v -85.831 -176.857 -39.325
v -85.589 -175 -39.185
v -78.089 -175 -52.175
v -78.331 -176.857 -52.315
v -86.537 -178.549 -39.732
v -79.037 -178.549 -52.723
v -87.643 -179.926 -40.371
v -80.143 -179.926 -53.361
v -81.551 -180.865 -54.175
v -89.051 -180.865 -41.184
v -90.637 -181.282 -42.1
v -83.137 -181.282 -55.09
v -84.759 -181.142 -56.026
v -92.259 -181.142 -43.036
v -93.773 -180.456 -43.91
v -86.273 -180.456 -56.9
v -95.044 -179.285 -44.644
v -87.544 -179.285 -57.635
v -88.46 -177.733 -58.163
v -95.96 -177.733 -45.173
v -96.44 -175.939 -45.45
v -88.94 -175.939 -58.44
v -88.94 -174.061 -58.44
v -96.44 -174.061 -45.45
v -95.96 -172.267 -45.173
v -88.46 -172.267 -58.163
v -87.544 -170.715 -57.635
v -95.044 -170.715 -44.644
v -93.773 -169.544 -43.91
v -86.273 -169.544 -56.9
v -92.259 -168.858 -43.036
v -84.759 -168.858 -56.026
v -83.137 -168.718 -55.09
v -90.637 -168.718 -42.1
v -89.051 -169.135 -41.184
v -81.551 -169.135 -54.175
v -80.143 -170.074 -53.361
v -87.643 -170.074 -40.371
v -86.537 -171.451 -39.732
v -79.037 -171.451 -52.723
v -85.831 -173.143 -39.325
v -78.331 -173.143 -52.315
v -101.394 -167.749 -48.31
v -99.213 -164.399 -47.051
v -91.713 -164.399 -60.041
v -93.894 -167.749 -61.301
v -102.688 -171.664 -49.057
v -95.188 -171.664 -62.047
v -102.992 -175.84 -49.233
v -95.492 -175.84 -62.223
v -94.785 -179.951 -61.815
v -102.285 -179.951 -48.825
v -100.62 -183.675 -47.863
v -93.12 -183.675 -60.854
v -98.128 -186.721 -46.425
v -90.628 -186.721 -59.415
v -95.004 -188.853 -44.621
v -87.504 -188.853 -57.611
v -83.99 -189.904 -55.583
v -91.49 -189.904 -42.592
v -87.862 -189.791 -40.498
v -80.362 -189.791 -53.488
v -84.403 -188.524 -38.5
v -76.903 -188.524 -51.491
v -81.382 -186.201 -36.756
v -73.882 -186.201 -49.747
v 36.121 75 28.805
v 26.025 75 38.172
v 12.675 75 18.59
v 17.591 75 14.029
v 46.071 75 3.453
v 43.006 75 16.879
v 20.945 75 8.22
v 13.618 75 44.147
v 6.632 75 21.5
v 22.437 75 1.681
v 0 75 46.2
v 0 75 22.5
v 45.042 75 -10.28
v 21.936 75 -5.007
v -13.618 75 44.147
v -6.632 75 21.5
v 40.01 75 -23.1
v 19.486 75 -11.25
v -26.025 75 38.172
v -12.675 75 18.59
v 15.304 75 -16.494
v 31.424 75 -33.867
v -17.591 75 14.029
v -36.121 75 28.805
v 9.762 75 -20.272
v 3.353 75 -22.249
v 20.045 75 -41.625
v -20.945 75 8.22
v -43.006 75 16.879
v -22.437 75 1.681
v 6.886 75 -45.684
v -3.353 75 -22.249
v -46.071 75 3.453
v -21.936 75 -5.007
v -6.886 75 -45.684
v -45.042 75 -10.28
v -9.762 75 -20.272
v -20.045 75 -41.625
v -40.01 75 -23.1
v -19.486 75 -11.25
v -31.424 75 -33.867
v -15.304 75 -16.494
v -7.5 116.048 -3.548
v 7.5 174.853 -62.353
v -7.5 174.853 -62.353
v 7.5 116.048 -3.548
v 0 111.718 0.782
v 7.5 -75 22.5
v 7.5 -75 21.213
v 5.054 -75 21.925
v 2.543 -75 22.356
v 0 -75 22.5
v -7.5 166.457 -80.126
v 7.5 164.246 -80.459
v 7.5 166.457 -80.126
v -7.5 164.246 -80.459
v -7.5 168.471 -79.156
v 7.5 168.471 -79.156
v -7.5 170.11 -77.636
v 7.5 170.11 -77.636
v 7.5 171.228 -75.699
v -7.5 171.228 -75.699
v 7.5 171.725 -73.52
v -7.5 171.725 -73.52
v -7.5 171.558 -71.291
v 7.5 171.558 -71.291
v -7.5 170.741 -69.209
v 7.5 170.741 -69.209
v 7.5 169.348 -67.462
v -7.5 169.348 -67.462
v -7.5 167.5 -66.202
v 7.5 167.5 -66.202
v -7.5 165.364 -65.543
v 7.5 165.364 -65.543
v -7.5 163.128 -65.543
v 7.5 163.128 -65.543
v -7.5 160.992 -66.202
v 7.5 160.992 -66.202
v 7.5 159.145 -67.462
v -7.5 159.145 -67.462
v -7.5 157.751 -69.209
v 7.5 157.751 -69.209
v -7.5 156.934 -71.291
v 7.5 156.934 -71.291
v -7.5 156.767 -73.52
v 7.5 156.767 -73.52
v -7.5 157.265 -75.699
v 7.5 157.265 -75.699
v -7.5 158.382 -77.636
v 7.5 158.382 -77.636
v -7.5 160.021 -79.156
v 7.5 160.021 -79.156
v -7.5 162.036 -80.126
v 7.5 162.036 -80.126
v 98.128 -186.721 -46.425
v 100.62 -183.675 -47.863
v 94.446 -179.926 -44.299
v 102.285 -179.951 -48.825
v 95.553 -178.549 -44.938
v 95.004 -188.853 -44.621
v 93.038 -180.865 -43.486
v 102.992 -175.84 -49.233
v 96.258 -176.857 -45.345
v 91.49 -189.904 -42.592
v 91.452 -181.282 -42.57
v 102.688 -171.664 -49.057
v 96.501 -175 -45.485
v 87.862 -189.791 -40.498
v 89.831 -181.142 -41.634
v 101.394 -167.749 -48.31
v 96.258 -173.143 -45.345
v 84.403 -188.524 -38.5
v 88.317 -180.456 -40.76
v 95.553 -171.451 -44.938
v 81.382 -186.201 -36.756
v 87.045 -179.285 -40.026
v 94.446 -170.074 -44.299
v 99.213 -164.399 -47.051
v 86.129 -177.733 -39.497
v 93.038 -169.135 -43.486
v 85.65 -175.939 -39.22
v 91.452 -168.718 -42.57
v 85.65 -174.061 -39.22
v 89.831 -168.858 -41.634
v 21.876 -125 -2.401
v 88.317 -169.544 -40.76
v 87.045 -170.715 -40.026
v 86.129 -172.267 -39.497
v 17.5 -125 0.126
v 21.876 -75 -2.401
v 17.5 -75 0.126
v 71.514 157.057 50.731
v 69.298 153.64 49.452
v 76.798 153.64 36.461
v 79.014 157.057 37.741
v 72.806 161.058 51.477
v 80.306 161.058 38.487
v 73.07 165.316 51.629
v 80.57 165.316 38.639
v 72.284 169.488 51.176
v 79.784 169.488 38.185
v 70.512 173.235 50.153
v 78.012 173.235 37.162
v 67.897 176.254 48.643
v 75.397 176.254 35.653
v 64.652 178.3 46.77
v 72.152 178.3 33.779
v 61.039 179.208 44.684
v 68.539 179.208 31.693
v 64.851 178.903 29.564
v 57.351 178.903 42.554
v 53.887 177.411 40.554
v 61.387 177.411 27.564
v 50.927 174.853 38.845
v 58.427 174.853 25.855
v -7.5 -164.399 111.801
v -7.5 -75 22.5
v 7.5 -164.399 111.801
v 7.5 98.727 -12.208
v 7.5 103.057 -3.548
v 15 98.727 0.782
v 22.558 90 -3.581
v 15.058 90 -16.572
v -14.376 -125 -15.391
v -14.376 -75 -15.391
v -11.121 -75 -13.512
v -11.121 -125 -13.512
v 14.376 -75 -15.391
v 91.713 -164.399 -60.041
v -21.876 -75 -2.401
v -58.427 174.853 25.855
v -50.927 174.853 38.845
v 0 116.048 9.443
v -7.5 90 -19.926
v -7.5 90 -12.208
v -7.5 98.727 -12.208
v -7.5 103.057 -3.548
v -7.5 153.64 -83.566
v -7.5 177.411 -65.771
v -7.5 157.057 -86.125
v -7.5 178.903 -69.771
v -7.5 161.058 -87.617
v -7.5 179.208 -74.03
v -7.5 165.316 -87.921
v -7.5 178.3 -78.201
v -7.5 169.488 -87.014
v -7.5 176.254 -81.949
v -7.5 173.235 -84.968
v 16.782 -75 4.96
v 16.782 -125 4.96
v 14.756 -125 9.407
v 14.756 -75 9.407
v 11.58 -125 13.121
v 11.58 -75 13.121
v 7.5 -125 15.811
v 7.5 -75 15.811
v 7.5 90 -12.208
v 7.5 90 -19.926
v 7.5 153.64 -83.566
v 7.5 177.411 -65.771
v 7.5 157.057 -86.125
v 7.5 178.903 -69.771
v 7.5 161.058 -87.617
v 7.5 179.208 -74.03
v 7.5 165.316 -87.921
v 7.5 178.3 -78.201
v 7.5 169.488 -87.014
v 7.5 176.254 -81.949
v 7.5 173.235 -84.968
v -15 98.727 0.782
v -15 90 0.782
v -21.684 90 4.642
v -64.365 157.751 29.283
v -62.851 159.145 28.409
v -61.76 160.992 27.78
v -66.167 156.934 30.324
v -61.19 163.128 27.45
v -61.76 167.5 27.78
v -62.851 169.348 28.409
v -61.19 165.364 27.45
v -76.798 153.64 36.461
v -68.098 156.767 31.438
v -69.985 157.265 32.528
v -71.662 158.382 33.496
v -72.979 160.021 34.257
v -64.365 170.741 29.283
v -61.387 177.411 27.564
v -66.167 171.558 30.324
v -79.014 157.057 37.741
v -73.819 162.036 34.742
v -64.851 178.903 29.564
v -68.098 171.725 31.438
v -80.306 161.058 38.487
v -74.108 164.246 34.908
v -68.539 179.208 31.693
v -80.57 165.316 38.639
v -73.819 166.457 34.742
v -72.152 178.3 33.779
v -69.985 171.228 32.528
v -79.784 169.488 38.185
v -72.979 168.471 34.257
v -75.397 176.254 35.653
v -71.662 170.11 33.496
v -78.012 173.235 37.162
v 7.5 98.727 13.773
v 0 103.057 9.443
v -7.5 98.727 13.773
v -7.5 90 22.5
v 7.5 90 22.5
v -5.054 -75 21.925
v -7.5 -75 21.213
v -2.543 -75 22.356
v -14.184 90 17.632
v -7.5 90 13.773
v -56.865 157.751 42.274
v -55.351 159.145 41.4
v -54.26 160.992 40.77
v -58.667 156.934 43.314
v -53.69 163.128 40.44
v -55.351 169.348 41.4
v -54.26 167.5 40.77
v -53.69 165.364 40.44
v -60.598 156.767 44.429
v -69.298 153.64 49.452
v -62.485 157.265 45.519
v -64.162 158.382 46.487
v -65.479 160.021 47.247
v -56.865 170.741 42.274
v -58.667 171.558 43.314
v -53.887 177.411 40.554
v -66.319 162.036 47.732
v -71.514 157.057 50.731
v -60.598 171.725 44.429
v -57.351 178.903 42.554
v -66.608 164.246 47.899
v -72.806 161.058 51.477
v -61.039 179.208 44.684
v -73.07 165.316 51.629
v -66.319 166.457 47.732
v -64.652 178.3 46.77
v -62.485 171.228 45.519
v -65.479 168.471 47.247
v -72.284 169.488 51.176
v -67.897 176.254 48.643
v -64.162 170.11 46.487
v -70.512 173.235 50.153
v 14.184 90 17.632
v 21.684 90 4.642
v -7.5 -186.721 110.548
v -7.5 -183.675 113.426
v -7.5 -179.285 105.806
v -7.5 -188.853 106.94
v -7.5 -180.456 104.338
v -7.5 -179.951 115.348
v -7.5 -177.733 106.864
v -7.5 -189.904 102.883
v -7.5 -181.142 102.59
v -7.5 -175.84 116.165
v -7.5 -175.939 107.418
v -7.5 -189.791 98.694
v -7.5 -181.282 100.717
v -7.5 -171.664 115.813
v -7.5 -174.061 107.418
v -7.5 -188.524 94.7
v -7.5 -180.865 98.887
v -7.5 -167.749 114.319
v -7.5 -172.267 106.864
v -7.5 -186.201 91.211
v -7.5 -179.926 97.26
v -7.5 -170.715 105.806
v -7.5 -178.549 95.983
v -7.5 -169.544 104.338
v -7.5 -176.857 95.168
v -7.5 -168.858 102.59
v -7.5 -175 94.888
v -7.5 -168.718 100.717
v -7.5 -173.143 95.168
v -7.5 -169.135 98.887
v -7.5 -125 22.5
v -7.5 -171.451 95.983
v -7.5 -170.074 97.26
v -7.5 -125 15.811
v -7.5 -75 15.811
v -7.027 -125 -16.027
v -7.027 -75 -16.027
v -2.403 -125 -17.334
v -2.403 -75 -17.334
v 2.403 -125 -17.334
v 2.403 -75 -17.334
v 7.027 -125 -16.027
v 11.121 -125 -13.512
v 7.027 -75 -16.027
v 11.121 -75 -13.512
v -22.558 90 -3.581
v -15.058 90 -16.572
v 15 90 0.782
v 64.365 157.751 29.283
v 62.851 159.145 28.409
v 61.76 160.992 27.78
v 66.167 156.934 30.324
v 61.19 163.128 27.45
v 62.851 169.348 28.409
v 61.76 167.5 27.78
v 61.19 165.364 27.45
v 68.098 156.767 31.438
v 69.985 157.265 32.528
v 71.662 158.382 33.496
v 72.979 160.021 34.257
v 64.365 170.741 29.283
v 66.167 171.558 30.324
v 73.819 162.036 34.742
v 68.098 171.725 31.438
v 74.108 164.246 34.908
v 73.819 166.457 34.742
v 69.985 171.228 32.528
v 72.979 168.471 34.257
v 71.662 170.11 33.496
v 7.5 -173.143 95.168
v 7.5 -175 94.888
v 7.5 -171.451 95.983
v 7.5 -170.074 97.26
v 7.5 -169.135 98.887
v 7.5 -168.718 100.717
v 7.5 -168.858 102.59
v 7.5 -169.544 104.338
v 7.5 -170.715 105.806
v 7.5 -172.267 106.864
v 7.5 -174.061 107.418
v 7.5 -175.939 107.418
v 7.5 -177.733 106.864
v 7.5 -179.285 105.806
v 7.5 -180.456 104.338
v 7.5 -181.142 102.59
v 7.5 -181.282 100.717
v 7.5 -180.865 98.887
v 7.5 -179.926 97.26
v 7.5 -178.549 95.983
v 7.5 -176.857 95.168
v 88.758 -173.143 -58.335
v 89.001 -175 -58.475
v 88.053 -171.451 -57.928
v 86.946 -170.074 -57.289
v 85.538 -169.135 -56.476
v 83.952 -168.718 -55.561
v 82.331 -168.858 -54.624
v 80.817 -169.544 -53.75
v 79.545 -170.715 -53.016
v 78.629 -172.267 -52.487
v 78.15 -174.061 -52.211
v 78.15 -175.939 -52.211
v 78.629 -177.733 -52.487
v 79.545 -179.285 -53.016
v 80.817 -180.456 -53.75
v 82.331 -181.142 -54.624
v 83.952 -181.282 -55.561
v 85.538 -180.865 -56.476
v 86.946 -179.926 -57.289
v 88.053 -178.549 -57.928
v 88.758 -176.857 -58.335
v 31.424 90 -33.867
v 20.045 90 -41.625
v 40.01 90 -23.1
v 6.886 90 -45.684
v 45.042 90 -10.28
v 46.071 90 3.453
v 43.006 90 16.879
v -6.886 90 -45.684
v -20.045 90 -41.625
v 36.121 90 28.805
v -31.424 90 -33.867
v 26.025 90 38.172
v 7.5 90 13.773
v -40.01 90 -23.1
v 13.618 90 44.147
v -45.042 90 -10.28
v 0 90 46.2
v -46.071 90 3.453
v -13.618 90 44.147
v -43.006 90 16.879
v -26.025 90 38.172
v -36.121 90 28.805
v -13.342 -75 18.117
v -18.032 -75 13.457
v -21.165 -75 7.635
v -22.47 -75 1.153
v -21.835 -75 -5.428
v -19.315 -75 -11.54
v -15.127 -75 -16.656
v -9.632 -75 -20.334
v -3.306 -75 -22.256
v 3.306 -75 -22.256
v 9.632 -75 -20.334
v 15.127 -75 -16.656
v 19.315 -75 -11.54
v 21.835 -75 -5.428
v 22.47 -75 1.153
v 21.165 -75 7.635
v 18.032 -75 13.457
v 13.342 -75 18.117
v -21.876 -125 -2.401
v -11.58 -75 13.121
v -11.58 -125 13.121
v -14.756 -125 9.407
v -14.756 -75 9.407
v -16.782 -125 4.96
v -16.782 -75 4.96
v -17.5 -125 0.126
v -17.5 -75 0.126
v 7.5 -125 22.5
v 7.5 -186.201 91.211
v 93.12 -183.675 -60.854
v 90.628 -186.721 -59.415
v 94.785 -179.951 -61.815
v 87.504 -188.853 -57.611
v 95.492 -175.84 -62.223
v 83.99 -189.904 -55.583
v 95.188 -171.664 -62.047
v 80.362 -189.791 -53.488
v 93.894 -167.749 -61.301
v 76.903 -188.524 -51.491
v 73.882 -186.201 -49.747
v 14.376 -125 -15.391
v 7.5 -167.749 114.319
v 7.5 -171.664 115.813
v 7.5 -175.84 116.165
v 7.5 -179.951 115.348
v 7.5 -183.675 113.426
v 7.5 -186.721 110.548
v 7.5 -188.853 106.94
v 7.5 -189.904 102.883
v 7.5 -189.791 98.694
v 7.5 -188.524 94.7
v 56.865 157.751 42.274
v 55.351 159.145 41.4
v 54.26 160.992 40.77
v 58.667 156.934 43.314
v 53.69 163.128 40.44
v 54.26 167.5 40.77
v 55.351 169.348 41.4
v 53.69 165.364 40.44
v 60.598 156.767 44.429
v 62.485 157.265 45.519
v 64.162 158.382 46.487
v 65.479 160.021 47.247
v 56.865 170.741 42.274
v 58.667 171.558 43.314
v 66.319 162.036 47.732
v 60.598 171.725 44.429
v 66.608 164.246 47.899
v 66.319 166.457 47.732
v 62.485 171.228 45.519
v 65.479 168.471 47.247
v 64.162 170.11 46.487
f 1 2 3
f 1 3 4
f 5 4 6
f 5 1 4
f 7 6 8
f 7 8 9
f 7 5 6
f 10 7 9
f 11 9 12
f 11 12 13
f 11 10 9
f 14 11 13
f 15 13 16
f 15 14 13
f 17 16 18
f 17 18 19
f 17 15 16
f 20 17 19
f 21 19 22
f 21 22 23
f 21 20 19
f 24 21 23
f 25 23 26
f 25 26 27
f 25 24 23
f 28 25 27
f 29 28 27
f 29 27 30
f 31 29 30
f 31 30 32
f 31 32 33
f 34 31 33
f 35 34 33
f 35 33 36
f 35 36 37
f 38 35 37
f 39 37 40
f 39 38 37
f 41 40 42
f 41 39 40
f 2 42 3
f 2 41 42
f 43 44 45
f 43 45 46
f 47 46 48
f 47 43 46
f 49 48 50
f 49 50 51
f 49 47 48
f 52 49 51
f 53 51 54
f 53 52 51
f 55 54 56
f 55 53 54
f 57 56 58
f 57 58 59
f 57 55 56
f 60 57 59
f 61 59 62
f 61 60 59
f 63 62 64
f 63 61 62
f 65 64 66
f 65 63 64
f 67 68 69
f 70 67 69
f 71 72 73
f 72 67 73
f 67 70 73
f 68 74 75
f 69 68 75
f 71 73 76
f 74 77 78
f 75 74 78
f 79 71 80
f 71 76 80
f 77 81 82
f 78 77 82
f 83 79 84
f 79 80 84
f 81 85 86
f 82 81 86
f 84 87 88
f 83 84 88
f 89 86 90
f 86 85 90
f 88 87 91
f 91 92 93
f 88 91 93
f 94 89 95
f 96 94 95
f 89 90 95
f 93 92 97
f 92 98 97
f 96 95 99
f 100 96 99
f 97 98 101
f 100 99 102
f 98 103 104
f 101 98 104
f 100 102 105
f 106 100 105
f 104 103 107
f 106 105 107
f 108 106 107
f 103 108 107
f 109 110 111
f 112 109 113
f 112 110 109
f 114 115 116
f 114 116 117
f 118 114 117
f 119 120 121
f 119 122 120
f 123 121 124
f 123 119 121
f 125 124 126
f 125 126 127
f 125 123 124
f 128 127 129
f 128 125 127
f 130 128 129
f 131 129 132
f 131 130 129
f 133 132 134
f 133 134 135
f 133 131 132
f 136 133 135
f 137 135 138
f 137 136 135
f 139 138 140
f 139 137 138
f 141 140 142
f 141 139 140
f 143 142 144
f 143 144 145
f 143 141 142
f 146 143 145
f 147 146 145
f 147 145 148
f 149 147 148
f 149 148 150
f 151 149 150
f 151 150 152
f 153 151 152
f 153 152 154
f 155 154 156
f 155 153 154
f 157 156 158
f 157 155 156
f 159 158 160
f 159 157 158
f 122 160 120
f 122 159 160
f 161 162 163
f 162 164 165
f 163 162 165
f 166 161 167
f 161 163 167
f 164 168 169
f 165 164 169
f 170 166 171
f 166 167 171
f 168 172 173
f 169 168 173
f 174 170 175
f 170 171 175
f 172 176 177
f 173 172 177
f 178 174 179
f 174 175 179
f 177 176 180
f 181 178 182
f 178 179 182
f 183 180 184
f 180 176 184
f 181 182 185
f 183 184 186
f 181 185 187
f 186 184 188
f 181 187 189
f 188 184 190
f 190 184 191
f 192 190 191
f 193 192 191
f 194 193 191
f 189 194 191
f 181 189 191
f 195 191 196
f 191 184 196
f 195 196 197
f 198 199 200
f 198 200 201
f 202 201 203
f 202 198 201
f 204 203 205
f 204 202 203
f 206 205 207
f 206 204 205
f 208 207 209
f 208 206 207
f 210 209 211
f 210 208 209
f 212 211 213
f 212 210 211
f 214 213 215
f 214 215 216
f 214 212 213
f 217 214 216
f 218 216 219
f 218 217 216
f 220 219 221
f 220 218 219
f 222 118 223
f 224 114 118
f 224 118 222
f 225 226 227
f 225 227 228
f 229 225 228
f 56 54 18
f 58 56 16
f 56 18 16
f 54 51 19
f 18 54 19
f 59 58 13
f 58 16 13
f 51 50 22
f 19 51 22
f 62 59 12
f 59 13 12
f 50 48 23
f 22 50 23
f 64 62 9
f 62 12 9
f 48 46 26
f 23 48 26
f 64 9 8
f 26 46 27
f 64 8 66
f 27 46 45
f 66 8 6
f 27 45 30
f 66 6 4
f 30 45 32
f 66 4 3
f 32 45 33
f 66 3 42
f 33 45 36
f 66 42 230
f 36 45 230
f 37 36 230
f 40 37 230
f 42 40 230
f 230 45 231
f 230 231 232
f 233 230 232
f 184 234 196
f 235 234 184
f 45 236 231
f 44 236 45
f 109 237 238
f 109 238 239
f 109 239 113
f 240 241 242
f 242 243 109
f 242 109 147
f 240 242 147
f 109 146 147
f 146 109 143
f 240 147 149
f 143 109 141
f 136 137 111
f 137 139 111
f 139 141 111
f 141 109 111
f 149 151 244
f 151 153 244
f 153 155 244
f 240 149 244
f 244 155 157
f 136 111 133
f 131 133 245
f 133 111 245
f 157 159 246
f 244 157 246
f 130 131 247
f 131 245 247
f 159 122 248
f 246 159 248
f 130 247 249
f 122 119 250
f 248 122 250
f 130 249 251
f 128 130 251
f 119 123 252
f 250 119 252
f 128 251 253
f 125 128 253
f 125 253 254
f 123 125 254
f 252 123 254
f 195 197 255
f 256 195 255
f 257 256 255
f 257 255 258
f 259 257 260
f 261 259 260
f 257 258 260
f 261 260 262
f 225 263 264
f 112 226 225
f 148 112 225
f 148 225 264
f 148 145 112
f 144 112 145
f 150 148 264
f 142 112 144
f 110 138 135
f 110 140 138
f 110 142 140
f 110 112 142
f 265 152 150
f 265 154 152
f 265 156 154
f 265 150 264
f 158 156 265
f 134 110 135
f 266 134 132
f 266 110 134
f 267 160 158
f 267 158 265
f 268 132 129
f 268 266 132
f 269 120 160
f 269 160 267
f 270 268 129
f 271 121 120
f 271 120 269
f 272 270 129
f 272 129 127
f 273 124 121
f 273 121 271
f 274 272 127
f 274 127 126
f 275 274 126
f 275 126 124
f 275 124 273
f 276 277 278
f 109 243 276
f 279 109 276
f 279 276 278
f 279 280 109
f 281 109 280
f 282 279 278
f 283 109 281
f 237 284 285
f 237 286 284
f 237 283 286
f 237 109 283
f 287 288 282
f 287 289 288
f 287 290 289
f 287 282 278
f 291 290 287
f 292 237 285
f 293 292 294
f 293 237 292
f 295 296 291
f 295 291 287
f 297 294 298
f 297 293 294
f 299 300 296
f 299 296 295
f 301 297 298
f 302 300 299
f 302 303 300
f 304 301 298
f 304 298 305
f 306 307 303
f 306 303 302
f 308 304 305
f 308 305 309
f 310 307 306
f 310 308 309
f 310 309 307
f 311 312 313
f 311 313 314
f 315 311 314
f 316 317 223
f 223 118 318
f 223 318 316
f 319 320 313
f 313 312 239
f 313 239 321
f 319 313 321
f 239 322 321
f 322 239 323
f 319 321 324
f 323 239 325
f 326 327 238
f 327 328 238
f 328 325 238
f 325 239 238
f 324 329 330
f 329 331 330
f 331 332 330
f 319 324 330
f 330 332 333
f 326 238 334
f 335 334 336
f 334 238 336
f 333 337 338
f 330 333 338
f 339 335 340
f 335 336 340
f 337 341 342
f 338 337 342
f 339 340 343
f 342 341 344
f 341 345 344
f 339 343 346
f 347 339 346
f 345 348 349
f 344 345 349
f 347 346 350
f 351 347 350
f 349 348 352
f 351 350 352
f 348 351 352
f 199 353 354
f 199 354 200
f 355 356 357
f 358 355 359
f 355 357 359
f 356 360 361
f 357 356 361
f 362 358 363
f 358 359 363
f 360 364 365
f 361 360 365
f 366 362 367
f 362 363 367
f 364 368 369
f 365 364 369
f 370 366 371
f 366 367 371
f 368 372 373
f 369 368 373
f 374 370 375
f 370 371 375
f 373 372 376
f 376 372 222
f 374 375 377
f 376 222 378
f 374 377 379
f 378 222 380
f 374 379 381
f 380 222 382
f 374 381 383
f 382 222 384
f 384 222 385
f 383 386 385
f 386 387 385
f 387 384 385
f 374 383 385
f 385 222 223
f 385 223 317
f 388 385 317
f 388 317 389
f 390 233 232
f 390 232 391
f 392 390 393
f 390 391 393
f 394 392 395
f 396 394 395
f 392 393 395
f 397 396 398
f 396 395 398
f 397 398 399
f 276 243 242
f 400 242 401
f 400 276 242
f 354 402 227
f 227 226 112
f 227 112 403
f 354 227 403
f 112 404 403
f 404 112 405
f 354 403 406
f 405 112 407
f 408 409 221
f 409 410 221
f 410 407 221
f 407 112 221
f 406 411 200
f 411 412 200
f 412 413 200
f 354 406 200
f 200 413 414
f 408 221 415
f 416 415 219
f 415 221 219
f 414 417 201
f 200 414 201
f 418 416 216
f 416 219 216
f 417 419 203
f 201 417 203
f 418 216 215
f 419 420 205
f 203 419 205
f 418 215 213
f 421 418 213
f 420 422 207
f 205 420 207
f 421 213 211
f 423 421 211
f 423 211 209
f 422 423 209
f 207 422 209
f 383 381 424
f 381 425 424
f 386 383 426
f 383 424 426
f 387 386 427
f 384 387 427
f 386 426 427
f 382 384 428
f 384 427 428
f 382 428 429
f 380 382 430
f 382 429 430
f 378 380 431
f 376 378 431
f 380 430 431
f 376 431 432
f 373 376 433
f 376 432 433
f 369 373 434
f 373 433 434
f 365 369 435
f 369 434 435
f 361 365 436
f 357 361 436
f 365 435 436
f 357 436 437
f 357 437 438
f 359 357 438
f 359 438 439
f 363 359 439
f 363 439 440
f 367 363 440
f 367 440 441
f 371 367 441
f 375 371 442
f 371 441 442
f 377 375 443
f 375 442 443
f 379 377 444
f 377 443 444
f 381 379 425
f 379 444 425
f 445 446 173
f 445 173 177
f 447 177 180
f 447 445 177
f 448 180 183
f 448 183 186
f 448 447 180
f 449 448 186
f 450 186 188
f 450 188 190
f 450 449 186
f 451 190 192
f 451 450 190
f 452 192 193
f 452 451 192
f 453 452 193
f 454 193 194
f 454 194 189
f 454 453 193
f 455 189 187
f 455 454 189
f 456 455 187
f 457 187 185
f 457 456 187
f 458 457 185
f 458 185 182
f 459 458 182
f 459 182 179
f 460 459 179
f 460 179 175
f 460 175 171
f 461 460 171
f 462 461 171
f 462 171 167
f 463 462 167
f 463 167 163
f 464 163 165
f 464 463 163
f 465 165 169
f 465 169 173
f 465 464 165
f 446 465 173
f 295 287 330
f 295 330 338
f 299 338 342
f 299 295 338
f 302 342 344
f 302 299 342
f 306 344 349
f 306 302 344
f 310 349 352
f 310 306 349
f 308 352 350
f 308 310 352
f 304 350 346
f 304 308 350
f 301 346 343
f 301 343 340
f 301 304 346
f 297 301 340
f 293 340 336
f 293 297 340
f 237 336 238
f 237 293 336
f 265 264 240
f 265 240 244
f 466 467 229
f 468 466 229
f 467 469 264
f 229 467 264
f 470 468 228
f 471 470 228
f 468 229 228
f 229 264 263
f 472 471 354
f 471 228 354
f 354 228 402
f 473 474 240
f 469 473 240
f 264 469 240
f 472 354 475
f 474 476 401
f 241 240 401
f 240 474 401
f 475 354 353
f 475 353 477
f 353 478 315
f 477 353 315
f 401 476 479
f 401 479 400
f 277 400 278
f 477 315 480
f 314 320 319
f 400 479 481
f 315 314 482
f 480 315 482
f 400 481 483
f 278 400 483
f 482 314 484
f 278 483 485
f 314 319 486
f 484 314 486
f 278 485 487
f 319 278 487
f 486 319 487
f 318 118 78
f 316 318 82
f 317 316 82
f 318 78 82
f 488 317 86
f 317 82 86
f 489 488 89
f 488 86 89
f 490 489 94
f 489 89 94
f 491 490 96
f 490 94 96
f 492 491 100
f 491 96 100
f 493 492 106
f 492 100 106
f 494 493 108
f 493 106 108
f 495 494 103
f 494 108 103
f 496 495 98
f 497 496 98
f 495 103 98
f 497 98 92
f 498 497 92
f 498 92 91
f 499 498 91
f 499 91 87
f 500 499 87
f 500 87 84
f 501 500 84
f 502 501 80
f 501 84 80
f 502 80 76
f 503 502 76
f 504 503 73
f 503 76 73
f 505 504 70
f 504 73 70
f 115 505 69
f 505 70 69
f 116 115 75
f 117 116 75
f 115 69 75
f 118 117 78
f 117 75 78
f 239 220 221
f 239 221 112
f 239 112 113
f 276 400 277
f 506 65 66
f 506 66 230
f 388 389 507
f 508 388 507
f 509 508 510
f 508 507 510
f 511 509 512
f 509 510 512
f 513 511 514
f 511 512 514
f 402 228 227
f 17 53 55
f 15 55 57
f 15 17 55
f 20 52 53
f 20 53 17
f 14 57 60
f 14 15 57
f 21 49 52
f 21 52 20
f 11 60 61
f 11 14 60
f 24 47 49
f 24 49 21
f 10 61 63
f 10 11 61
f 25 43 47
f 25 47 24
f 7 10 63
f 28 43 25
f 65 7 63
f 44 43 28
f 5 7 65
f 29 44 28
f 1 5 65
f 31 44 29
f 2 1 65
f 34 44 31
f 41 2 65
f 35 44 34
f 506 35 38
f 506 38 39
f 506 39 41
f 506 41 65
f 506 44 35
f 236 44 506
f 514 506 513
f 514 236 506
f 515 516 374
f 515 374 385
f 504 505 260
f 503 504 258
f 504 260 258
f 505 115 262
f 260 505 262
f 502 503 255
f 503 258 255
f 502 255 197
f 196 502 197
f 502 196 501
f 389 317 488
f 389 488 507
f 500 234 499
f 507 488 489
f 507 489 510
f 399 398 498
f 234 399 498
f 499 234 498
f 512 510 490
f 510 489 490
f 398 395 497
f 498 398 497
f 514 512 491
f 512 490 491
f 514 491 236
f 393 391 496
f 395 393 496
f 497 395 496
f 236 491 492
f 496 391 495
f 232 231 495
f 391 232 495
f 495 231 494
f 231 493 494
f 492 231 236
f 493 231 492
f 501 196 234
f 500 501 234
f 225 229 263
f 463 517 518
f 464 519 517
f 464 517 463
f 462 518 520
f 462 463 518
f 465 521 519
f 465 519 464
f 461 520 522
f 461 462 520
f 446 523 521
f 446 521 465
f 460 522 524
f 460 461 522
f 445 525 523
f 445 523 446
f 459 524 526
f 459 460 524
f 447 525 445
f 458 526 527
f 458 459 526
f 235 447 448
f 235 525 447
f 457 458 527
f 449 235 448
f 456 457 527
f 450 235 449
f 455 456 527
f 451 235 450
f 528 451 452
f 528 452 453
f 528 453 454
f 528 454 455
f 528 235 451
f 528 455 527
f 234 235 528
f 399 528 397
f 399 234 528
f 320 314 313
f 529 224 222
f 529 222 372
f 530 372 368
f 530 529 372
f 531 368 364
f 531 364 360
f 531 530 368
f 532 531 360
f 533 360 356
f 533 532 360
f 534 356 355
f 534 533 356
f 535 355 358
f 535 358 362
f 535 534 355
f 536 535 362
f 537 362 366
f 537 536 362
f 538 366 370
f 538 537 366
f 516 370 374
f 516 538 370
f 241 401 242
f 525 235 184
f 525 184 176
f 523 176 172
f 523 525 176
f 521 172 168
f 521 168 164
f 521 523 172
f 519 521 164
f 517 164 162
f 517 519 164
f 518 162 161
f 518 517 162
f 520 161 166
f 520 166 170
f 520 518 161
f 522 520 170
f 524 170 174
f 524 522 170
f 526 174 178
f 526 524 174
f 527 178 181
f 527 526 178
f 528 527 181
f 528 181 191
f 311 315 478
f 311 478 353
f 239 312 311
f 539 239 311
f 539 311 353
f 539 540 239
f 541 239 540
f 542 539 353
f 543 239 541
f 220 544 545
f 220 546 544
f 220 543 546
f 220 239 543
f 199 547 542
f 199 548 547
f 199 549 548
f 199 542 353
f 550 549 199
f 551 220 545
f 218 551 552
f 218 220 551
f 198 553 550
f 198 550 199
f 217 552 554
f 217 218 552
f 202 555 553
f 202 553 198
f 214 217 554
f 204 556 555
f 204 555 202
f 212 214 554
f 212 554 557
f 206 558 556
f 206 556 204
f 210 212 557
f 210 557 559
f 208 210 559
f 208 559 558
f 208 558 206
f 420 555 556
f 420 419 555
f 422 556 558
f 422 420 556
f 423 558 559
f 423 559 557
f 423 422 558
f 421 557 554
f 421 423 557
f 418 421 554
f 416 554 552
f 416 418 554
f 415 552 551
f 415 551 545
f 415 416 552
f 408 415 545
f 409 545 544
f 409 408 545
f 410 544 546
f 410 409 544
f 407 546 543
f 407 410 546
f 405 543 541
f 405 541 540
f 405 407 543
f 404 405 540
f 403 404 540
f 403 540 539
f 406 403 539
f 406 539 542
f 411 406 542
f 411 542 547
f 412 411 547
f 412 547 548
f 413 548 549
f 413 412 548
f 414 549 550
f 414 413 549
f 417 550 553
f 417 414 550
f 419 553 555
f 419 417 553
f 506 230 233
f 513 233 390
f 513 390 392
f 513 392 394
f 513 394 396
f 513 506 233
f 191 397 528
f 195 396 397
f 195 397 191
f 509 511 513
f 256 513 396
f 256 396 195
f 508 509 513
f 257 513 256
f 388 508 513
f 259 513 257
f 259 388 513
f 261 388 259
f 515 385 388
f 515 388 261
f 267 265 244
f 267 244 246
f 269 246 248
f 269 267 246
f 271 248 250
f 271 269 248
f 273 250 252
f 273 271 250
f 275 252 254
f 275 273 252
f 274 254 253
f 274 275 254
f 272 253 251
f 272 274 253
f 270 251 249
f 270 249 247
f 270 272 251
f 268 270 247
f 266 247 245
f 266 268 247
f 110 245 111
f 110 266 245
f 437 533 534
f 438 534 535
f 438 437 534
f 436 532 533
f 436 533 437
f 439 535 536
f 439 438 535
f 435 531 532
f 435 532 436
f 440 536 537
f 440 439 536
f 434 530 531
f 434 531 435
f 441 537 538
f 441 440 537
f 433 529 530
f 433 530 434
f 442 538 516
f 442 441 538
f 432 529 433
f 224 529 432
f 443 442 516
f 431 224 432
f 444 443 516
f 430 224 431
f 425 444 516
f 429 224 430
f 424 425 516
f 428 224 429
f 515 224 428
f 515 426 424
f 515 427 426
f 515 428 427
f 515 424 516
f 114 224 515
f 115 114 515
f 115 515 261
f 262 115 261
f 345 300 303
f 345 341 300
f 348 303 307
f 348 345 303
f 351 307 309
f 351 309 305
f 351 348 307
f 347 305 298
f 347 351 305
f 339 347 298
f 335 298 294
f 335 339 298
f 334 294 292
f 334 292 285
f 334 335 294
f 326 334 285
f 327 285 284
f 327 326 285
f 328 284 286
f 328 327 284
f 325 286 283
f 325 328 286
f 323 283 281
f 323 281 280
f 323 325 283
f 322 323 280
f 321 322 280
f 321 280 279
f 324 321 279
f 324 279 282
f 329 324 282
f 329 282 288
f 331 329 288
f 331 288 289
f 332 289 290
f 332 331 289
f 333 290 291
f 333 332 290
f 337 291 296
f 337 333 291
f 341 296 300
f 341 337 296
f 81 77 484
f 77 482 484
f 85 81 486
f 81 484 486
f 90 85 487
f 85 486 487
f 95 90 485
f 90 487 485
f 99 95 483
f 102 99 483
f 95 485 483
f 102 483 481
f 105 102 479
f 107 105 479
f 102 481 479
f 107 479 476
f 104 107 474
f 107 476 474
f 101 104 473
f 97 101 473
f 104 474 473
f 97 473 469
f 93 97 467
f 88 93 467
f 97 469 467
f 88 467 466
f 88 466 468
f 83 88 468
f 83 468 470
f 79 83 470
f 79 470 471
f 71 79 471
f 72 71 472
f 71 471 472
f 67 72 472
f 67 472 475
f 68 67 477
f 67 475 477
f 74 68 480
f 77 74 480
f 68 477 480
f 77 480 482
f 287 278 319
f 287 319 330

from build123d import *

# Parameters (mm, degrees)
CROQUIS3_R               = 7.5
SALIENTE_EXTRUIR10_DEPTH = 7.5
SALIENTE_EXTRUIR24_DEPTH = 7.5
CROQUIS5_R               = 6.3
CORTAR_EXTRUIR1_DEPTH    = 10
MATRIZC1_COUNT           = 3
MATRIZC2_START           = -8.85913735
MATRIZC2_OUTLINE_R       = 6.3
MATRIZC2_DEPTH           = 15
MATRIZC2_START_2         = -6.14086265
MATRIZC2_2_OUTLINE_R     = 6.3
MATRIZC2_2_DEPTH         = 15
MATRIZC3_COUNT           = 3


# Read off the part's stored shape, not the designer's step: MatrizC2
with BuildPart() as part:
    # Croquis1 → Revolución1 (revolve)
    with BuildSketch(Plane(origin=(0, 0, 0), x_dir=(0, 0, -1), z_dir=(1, 0, 0)), mode=Mode.PRIVATE) as revoluci_n1_sk:
        Polygon((0, 90), (0, -125), (17.5, -125), (17.5, -75), (22.5, -75), (22.5, 75), (46.2, 75), (46.2, 90), align=None)
    revolve(revoluci_n1_sk.sketch.rotate(Axis((0, 90, 0), (0, -1, 0)), 180), axis=Axis((0, 90, 0), (0, -1, 0)))

    # Croquis3 → Saliente-Extruir10 (add, symmetric)
    with BuildSketch(Plane(origin=(0, 0, 0), x_dir=(0, 0, -1), z_dir=(1, 0, 0))):
        with BuildLine():
            Line((-22.5, 90), (19.926406871, 90))
            Line((19.926406871, 90), (83.566017178, 153.639610307))
            ThreePointArc((83.566017178, 153.639610307), (83.566017178, 174.852813742), (62.352813742, 174.852813742))
            Line((62.352813742, 174.852813742), (-22.5, 90))
        make_face()
        with Locations((72.95941546, 164.246212025)):
            Circle(CROQUIS3_R, mode=Mode.SUBTRACT)
    saliente_extruir10 = extrude(amount=SALIENTE_EXTRUIR10_DEPTH, both=True)

    # Croquis4 → Saliente-Extruir24 (add, symmetric)
    with BuildSketch(Plane(origin=(0, 0, 0), x_dir=(0, 0, -1), z_dir=(1, 0, 0))):
        with BuildLine():
            Line((-22.5, -75), (-111.800673807, -164.399250863))
            ThreePointArc((-111.800673807, -164.399250863), (-112.093769258, -185.298983205), (-91.211457576, -186.201078383))
            Line((-91.211457576, -186.201078383), (-22.5, -125))
            Line((-22.5, -125), (-3.021288489, -125))
            Line((-3.021288489, -125), (-3.021288489, -75))
            Line((-3.021288489, -75), (-22.5, -75))
        make_face()
    saliente_extruir24 = extrude(amount=SALIENTE_EXTRUIR24_DEPTH, both=True)

    # Croquis5 → Cortar-Extruir1 (cut, symmetric)
    with BuildSketch(Plane(origin=(0, 0, 0), x_dir=(0, 0, -1), z_dir=(1, 0, 0))):
        with Locations((-101.188222736, -175)):
            Circle(CROQUIS5_R)
    extrude(amount=CORTAR_EXTRUIR1_DEPTH, both=True, mode=Mode.SUBTRACT)

    # MatrizC1: Saliente-Extruir24 ×3 about axis
    matrizc1_axis = Axis((0, 0, 1.56939663), (0, 1, 0))
    for i in range(1, MATRIZC1_COUNT):
        add(saliente_extruir24.rotate(matrizc1_axis, i * 360 / MATRIZC1_COUNT))

    # MatrizC2 outline → MatrizC2 (cut)
    with BuildSketch(Plane(origin=(0, 0, 0), x_dir=(0.8660254037844362, 0, 0.5000000000000042), z_dir=(0.5000000000000042, 0, -0.8660254037844363)).offset(MATRIZC2_START)):
        with Locations((-100.01457544, 175)):
            Circle(MATRIZC2_OUTLINE_R)
    extrude(amount=MATRIZC2_DEPTH, mode=Mode.SUBTRACT)

    # MatrizC2 2 outline → MatrizC2 2 (cut)
    with BuildSketch(Plane(origin=(0, 0, 0), x_dir=(0.8660254037844431, 0, -0.4999999999999921), z_dir=(0.4999999999999921, 0, 0.8660254037844433)).offset(MATRIZC2_START_2)):
        with Locations((100.01457544, -175)):
            Circle(MATRIZC2_2_OUTLINE_R)
    extrude(amount=MATRIZC2_2_DEPTH, mode=Mode.SUBTRACT)

    # MatrizC3: Saliente-Extruir10 ×3 about axis
    matrizc3_axis = Axis((0, 0, 0.782431531), (0, 1, 0))
    for i in range(1, MATRIZC3_COUNT):
        add(saliente_extruir10.rotate(matrizc3_axis, i * 360 / MATRIZC3_COUNT))


solid = part.part
